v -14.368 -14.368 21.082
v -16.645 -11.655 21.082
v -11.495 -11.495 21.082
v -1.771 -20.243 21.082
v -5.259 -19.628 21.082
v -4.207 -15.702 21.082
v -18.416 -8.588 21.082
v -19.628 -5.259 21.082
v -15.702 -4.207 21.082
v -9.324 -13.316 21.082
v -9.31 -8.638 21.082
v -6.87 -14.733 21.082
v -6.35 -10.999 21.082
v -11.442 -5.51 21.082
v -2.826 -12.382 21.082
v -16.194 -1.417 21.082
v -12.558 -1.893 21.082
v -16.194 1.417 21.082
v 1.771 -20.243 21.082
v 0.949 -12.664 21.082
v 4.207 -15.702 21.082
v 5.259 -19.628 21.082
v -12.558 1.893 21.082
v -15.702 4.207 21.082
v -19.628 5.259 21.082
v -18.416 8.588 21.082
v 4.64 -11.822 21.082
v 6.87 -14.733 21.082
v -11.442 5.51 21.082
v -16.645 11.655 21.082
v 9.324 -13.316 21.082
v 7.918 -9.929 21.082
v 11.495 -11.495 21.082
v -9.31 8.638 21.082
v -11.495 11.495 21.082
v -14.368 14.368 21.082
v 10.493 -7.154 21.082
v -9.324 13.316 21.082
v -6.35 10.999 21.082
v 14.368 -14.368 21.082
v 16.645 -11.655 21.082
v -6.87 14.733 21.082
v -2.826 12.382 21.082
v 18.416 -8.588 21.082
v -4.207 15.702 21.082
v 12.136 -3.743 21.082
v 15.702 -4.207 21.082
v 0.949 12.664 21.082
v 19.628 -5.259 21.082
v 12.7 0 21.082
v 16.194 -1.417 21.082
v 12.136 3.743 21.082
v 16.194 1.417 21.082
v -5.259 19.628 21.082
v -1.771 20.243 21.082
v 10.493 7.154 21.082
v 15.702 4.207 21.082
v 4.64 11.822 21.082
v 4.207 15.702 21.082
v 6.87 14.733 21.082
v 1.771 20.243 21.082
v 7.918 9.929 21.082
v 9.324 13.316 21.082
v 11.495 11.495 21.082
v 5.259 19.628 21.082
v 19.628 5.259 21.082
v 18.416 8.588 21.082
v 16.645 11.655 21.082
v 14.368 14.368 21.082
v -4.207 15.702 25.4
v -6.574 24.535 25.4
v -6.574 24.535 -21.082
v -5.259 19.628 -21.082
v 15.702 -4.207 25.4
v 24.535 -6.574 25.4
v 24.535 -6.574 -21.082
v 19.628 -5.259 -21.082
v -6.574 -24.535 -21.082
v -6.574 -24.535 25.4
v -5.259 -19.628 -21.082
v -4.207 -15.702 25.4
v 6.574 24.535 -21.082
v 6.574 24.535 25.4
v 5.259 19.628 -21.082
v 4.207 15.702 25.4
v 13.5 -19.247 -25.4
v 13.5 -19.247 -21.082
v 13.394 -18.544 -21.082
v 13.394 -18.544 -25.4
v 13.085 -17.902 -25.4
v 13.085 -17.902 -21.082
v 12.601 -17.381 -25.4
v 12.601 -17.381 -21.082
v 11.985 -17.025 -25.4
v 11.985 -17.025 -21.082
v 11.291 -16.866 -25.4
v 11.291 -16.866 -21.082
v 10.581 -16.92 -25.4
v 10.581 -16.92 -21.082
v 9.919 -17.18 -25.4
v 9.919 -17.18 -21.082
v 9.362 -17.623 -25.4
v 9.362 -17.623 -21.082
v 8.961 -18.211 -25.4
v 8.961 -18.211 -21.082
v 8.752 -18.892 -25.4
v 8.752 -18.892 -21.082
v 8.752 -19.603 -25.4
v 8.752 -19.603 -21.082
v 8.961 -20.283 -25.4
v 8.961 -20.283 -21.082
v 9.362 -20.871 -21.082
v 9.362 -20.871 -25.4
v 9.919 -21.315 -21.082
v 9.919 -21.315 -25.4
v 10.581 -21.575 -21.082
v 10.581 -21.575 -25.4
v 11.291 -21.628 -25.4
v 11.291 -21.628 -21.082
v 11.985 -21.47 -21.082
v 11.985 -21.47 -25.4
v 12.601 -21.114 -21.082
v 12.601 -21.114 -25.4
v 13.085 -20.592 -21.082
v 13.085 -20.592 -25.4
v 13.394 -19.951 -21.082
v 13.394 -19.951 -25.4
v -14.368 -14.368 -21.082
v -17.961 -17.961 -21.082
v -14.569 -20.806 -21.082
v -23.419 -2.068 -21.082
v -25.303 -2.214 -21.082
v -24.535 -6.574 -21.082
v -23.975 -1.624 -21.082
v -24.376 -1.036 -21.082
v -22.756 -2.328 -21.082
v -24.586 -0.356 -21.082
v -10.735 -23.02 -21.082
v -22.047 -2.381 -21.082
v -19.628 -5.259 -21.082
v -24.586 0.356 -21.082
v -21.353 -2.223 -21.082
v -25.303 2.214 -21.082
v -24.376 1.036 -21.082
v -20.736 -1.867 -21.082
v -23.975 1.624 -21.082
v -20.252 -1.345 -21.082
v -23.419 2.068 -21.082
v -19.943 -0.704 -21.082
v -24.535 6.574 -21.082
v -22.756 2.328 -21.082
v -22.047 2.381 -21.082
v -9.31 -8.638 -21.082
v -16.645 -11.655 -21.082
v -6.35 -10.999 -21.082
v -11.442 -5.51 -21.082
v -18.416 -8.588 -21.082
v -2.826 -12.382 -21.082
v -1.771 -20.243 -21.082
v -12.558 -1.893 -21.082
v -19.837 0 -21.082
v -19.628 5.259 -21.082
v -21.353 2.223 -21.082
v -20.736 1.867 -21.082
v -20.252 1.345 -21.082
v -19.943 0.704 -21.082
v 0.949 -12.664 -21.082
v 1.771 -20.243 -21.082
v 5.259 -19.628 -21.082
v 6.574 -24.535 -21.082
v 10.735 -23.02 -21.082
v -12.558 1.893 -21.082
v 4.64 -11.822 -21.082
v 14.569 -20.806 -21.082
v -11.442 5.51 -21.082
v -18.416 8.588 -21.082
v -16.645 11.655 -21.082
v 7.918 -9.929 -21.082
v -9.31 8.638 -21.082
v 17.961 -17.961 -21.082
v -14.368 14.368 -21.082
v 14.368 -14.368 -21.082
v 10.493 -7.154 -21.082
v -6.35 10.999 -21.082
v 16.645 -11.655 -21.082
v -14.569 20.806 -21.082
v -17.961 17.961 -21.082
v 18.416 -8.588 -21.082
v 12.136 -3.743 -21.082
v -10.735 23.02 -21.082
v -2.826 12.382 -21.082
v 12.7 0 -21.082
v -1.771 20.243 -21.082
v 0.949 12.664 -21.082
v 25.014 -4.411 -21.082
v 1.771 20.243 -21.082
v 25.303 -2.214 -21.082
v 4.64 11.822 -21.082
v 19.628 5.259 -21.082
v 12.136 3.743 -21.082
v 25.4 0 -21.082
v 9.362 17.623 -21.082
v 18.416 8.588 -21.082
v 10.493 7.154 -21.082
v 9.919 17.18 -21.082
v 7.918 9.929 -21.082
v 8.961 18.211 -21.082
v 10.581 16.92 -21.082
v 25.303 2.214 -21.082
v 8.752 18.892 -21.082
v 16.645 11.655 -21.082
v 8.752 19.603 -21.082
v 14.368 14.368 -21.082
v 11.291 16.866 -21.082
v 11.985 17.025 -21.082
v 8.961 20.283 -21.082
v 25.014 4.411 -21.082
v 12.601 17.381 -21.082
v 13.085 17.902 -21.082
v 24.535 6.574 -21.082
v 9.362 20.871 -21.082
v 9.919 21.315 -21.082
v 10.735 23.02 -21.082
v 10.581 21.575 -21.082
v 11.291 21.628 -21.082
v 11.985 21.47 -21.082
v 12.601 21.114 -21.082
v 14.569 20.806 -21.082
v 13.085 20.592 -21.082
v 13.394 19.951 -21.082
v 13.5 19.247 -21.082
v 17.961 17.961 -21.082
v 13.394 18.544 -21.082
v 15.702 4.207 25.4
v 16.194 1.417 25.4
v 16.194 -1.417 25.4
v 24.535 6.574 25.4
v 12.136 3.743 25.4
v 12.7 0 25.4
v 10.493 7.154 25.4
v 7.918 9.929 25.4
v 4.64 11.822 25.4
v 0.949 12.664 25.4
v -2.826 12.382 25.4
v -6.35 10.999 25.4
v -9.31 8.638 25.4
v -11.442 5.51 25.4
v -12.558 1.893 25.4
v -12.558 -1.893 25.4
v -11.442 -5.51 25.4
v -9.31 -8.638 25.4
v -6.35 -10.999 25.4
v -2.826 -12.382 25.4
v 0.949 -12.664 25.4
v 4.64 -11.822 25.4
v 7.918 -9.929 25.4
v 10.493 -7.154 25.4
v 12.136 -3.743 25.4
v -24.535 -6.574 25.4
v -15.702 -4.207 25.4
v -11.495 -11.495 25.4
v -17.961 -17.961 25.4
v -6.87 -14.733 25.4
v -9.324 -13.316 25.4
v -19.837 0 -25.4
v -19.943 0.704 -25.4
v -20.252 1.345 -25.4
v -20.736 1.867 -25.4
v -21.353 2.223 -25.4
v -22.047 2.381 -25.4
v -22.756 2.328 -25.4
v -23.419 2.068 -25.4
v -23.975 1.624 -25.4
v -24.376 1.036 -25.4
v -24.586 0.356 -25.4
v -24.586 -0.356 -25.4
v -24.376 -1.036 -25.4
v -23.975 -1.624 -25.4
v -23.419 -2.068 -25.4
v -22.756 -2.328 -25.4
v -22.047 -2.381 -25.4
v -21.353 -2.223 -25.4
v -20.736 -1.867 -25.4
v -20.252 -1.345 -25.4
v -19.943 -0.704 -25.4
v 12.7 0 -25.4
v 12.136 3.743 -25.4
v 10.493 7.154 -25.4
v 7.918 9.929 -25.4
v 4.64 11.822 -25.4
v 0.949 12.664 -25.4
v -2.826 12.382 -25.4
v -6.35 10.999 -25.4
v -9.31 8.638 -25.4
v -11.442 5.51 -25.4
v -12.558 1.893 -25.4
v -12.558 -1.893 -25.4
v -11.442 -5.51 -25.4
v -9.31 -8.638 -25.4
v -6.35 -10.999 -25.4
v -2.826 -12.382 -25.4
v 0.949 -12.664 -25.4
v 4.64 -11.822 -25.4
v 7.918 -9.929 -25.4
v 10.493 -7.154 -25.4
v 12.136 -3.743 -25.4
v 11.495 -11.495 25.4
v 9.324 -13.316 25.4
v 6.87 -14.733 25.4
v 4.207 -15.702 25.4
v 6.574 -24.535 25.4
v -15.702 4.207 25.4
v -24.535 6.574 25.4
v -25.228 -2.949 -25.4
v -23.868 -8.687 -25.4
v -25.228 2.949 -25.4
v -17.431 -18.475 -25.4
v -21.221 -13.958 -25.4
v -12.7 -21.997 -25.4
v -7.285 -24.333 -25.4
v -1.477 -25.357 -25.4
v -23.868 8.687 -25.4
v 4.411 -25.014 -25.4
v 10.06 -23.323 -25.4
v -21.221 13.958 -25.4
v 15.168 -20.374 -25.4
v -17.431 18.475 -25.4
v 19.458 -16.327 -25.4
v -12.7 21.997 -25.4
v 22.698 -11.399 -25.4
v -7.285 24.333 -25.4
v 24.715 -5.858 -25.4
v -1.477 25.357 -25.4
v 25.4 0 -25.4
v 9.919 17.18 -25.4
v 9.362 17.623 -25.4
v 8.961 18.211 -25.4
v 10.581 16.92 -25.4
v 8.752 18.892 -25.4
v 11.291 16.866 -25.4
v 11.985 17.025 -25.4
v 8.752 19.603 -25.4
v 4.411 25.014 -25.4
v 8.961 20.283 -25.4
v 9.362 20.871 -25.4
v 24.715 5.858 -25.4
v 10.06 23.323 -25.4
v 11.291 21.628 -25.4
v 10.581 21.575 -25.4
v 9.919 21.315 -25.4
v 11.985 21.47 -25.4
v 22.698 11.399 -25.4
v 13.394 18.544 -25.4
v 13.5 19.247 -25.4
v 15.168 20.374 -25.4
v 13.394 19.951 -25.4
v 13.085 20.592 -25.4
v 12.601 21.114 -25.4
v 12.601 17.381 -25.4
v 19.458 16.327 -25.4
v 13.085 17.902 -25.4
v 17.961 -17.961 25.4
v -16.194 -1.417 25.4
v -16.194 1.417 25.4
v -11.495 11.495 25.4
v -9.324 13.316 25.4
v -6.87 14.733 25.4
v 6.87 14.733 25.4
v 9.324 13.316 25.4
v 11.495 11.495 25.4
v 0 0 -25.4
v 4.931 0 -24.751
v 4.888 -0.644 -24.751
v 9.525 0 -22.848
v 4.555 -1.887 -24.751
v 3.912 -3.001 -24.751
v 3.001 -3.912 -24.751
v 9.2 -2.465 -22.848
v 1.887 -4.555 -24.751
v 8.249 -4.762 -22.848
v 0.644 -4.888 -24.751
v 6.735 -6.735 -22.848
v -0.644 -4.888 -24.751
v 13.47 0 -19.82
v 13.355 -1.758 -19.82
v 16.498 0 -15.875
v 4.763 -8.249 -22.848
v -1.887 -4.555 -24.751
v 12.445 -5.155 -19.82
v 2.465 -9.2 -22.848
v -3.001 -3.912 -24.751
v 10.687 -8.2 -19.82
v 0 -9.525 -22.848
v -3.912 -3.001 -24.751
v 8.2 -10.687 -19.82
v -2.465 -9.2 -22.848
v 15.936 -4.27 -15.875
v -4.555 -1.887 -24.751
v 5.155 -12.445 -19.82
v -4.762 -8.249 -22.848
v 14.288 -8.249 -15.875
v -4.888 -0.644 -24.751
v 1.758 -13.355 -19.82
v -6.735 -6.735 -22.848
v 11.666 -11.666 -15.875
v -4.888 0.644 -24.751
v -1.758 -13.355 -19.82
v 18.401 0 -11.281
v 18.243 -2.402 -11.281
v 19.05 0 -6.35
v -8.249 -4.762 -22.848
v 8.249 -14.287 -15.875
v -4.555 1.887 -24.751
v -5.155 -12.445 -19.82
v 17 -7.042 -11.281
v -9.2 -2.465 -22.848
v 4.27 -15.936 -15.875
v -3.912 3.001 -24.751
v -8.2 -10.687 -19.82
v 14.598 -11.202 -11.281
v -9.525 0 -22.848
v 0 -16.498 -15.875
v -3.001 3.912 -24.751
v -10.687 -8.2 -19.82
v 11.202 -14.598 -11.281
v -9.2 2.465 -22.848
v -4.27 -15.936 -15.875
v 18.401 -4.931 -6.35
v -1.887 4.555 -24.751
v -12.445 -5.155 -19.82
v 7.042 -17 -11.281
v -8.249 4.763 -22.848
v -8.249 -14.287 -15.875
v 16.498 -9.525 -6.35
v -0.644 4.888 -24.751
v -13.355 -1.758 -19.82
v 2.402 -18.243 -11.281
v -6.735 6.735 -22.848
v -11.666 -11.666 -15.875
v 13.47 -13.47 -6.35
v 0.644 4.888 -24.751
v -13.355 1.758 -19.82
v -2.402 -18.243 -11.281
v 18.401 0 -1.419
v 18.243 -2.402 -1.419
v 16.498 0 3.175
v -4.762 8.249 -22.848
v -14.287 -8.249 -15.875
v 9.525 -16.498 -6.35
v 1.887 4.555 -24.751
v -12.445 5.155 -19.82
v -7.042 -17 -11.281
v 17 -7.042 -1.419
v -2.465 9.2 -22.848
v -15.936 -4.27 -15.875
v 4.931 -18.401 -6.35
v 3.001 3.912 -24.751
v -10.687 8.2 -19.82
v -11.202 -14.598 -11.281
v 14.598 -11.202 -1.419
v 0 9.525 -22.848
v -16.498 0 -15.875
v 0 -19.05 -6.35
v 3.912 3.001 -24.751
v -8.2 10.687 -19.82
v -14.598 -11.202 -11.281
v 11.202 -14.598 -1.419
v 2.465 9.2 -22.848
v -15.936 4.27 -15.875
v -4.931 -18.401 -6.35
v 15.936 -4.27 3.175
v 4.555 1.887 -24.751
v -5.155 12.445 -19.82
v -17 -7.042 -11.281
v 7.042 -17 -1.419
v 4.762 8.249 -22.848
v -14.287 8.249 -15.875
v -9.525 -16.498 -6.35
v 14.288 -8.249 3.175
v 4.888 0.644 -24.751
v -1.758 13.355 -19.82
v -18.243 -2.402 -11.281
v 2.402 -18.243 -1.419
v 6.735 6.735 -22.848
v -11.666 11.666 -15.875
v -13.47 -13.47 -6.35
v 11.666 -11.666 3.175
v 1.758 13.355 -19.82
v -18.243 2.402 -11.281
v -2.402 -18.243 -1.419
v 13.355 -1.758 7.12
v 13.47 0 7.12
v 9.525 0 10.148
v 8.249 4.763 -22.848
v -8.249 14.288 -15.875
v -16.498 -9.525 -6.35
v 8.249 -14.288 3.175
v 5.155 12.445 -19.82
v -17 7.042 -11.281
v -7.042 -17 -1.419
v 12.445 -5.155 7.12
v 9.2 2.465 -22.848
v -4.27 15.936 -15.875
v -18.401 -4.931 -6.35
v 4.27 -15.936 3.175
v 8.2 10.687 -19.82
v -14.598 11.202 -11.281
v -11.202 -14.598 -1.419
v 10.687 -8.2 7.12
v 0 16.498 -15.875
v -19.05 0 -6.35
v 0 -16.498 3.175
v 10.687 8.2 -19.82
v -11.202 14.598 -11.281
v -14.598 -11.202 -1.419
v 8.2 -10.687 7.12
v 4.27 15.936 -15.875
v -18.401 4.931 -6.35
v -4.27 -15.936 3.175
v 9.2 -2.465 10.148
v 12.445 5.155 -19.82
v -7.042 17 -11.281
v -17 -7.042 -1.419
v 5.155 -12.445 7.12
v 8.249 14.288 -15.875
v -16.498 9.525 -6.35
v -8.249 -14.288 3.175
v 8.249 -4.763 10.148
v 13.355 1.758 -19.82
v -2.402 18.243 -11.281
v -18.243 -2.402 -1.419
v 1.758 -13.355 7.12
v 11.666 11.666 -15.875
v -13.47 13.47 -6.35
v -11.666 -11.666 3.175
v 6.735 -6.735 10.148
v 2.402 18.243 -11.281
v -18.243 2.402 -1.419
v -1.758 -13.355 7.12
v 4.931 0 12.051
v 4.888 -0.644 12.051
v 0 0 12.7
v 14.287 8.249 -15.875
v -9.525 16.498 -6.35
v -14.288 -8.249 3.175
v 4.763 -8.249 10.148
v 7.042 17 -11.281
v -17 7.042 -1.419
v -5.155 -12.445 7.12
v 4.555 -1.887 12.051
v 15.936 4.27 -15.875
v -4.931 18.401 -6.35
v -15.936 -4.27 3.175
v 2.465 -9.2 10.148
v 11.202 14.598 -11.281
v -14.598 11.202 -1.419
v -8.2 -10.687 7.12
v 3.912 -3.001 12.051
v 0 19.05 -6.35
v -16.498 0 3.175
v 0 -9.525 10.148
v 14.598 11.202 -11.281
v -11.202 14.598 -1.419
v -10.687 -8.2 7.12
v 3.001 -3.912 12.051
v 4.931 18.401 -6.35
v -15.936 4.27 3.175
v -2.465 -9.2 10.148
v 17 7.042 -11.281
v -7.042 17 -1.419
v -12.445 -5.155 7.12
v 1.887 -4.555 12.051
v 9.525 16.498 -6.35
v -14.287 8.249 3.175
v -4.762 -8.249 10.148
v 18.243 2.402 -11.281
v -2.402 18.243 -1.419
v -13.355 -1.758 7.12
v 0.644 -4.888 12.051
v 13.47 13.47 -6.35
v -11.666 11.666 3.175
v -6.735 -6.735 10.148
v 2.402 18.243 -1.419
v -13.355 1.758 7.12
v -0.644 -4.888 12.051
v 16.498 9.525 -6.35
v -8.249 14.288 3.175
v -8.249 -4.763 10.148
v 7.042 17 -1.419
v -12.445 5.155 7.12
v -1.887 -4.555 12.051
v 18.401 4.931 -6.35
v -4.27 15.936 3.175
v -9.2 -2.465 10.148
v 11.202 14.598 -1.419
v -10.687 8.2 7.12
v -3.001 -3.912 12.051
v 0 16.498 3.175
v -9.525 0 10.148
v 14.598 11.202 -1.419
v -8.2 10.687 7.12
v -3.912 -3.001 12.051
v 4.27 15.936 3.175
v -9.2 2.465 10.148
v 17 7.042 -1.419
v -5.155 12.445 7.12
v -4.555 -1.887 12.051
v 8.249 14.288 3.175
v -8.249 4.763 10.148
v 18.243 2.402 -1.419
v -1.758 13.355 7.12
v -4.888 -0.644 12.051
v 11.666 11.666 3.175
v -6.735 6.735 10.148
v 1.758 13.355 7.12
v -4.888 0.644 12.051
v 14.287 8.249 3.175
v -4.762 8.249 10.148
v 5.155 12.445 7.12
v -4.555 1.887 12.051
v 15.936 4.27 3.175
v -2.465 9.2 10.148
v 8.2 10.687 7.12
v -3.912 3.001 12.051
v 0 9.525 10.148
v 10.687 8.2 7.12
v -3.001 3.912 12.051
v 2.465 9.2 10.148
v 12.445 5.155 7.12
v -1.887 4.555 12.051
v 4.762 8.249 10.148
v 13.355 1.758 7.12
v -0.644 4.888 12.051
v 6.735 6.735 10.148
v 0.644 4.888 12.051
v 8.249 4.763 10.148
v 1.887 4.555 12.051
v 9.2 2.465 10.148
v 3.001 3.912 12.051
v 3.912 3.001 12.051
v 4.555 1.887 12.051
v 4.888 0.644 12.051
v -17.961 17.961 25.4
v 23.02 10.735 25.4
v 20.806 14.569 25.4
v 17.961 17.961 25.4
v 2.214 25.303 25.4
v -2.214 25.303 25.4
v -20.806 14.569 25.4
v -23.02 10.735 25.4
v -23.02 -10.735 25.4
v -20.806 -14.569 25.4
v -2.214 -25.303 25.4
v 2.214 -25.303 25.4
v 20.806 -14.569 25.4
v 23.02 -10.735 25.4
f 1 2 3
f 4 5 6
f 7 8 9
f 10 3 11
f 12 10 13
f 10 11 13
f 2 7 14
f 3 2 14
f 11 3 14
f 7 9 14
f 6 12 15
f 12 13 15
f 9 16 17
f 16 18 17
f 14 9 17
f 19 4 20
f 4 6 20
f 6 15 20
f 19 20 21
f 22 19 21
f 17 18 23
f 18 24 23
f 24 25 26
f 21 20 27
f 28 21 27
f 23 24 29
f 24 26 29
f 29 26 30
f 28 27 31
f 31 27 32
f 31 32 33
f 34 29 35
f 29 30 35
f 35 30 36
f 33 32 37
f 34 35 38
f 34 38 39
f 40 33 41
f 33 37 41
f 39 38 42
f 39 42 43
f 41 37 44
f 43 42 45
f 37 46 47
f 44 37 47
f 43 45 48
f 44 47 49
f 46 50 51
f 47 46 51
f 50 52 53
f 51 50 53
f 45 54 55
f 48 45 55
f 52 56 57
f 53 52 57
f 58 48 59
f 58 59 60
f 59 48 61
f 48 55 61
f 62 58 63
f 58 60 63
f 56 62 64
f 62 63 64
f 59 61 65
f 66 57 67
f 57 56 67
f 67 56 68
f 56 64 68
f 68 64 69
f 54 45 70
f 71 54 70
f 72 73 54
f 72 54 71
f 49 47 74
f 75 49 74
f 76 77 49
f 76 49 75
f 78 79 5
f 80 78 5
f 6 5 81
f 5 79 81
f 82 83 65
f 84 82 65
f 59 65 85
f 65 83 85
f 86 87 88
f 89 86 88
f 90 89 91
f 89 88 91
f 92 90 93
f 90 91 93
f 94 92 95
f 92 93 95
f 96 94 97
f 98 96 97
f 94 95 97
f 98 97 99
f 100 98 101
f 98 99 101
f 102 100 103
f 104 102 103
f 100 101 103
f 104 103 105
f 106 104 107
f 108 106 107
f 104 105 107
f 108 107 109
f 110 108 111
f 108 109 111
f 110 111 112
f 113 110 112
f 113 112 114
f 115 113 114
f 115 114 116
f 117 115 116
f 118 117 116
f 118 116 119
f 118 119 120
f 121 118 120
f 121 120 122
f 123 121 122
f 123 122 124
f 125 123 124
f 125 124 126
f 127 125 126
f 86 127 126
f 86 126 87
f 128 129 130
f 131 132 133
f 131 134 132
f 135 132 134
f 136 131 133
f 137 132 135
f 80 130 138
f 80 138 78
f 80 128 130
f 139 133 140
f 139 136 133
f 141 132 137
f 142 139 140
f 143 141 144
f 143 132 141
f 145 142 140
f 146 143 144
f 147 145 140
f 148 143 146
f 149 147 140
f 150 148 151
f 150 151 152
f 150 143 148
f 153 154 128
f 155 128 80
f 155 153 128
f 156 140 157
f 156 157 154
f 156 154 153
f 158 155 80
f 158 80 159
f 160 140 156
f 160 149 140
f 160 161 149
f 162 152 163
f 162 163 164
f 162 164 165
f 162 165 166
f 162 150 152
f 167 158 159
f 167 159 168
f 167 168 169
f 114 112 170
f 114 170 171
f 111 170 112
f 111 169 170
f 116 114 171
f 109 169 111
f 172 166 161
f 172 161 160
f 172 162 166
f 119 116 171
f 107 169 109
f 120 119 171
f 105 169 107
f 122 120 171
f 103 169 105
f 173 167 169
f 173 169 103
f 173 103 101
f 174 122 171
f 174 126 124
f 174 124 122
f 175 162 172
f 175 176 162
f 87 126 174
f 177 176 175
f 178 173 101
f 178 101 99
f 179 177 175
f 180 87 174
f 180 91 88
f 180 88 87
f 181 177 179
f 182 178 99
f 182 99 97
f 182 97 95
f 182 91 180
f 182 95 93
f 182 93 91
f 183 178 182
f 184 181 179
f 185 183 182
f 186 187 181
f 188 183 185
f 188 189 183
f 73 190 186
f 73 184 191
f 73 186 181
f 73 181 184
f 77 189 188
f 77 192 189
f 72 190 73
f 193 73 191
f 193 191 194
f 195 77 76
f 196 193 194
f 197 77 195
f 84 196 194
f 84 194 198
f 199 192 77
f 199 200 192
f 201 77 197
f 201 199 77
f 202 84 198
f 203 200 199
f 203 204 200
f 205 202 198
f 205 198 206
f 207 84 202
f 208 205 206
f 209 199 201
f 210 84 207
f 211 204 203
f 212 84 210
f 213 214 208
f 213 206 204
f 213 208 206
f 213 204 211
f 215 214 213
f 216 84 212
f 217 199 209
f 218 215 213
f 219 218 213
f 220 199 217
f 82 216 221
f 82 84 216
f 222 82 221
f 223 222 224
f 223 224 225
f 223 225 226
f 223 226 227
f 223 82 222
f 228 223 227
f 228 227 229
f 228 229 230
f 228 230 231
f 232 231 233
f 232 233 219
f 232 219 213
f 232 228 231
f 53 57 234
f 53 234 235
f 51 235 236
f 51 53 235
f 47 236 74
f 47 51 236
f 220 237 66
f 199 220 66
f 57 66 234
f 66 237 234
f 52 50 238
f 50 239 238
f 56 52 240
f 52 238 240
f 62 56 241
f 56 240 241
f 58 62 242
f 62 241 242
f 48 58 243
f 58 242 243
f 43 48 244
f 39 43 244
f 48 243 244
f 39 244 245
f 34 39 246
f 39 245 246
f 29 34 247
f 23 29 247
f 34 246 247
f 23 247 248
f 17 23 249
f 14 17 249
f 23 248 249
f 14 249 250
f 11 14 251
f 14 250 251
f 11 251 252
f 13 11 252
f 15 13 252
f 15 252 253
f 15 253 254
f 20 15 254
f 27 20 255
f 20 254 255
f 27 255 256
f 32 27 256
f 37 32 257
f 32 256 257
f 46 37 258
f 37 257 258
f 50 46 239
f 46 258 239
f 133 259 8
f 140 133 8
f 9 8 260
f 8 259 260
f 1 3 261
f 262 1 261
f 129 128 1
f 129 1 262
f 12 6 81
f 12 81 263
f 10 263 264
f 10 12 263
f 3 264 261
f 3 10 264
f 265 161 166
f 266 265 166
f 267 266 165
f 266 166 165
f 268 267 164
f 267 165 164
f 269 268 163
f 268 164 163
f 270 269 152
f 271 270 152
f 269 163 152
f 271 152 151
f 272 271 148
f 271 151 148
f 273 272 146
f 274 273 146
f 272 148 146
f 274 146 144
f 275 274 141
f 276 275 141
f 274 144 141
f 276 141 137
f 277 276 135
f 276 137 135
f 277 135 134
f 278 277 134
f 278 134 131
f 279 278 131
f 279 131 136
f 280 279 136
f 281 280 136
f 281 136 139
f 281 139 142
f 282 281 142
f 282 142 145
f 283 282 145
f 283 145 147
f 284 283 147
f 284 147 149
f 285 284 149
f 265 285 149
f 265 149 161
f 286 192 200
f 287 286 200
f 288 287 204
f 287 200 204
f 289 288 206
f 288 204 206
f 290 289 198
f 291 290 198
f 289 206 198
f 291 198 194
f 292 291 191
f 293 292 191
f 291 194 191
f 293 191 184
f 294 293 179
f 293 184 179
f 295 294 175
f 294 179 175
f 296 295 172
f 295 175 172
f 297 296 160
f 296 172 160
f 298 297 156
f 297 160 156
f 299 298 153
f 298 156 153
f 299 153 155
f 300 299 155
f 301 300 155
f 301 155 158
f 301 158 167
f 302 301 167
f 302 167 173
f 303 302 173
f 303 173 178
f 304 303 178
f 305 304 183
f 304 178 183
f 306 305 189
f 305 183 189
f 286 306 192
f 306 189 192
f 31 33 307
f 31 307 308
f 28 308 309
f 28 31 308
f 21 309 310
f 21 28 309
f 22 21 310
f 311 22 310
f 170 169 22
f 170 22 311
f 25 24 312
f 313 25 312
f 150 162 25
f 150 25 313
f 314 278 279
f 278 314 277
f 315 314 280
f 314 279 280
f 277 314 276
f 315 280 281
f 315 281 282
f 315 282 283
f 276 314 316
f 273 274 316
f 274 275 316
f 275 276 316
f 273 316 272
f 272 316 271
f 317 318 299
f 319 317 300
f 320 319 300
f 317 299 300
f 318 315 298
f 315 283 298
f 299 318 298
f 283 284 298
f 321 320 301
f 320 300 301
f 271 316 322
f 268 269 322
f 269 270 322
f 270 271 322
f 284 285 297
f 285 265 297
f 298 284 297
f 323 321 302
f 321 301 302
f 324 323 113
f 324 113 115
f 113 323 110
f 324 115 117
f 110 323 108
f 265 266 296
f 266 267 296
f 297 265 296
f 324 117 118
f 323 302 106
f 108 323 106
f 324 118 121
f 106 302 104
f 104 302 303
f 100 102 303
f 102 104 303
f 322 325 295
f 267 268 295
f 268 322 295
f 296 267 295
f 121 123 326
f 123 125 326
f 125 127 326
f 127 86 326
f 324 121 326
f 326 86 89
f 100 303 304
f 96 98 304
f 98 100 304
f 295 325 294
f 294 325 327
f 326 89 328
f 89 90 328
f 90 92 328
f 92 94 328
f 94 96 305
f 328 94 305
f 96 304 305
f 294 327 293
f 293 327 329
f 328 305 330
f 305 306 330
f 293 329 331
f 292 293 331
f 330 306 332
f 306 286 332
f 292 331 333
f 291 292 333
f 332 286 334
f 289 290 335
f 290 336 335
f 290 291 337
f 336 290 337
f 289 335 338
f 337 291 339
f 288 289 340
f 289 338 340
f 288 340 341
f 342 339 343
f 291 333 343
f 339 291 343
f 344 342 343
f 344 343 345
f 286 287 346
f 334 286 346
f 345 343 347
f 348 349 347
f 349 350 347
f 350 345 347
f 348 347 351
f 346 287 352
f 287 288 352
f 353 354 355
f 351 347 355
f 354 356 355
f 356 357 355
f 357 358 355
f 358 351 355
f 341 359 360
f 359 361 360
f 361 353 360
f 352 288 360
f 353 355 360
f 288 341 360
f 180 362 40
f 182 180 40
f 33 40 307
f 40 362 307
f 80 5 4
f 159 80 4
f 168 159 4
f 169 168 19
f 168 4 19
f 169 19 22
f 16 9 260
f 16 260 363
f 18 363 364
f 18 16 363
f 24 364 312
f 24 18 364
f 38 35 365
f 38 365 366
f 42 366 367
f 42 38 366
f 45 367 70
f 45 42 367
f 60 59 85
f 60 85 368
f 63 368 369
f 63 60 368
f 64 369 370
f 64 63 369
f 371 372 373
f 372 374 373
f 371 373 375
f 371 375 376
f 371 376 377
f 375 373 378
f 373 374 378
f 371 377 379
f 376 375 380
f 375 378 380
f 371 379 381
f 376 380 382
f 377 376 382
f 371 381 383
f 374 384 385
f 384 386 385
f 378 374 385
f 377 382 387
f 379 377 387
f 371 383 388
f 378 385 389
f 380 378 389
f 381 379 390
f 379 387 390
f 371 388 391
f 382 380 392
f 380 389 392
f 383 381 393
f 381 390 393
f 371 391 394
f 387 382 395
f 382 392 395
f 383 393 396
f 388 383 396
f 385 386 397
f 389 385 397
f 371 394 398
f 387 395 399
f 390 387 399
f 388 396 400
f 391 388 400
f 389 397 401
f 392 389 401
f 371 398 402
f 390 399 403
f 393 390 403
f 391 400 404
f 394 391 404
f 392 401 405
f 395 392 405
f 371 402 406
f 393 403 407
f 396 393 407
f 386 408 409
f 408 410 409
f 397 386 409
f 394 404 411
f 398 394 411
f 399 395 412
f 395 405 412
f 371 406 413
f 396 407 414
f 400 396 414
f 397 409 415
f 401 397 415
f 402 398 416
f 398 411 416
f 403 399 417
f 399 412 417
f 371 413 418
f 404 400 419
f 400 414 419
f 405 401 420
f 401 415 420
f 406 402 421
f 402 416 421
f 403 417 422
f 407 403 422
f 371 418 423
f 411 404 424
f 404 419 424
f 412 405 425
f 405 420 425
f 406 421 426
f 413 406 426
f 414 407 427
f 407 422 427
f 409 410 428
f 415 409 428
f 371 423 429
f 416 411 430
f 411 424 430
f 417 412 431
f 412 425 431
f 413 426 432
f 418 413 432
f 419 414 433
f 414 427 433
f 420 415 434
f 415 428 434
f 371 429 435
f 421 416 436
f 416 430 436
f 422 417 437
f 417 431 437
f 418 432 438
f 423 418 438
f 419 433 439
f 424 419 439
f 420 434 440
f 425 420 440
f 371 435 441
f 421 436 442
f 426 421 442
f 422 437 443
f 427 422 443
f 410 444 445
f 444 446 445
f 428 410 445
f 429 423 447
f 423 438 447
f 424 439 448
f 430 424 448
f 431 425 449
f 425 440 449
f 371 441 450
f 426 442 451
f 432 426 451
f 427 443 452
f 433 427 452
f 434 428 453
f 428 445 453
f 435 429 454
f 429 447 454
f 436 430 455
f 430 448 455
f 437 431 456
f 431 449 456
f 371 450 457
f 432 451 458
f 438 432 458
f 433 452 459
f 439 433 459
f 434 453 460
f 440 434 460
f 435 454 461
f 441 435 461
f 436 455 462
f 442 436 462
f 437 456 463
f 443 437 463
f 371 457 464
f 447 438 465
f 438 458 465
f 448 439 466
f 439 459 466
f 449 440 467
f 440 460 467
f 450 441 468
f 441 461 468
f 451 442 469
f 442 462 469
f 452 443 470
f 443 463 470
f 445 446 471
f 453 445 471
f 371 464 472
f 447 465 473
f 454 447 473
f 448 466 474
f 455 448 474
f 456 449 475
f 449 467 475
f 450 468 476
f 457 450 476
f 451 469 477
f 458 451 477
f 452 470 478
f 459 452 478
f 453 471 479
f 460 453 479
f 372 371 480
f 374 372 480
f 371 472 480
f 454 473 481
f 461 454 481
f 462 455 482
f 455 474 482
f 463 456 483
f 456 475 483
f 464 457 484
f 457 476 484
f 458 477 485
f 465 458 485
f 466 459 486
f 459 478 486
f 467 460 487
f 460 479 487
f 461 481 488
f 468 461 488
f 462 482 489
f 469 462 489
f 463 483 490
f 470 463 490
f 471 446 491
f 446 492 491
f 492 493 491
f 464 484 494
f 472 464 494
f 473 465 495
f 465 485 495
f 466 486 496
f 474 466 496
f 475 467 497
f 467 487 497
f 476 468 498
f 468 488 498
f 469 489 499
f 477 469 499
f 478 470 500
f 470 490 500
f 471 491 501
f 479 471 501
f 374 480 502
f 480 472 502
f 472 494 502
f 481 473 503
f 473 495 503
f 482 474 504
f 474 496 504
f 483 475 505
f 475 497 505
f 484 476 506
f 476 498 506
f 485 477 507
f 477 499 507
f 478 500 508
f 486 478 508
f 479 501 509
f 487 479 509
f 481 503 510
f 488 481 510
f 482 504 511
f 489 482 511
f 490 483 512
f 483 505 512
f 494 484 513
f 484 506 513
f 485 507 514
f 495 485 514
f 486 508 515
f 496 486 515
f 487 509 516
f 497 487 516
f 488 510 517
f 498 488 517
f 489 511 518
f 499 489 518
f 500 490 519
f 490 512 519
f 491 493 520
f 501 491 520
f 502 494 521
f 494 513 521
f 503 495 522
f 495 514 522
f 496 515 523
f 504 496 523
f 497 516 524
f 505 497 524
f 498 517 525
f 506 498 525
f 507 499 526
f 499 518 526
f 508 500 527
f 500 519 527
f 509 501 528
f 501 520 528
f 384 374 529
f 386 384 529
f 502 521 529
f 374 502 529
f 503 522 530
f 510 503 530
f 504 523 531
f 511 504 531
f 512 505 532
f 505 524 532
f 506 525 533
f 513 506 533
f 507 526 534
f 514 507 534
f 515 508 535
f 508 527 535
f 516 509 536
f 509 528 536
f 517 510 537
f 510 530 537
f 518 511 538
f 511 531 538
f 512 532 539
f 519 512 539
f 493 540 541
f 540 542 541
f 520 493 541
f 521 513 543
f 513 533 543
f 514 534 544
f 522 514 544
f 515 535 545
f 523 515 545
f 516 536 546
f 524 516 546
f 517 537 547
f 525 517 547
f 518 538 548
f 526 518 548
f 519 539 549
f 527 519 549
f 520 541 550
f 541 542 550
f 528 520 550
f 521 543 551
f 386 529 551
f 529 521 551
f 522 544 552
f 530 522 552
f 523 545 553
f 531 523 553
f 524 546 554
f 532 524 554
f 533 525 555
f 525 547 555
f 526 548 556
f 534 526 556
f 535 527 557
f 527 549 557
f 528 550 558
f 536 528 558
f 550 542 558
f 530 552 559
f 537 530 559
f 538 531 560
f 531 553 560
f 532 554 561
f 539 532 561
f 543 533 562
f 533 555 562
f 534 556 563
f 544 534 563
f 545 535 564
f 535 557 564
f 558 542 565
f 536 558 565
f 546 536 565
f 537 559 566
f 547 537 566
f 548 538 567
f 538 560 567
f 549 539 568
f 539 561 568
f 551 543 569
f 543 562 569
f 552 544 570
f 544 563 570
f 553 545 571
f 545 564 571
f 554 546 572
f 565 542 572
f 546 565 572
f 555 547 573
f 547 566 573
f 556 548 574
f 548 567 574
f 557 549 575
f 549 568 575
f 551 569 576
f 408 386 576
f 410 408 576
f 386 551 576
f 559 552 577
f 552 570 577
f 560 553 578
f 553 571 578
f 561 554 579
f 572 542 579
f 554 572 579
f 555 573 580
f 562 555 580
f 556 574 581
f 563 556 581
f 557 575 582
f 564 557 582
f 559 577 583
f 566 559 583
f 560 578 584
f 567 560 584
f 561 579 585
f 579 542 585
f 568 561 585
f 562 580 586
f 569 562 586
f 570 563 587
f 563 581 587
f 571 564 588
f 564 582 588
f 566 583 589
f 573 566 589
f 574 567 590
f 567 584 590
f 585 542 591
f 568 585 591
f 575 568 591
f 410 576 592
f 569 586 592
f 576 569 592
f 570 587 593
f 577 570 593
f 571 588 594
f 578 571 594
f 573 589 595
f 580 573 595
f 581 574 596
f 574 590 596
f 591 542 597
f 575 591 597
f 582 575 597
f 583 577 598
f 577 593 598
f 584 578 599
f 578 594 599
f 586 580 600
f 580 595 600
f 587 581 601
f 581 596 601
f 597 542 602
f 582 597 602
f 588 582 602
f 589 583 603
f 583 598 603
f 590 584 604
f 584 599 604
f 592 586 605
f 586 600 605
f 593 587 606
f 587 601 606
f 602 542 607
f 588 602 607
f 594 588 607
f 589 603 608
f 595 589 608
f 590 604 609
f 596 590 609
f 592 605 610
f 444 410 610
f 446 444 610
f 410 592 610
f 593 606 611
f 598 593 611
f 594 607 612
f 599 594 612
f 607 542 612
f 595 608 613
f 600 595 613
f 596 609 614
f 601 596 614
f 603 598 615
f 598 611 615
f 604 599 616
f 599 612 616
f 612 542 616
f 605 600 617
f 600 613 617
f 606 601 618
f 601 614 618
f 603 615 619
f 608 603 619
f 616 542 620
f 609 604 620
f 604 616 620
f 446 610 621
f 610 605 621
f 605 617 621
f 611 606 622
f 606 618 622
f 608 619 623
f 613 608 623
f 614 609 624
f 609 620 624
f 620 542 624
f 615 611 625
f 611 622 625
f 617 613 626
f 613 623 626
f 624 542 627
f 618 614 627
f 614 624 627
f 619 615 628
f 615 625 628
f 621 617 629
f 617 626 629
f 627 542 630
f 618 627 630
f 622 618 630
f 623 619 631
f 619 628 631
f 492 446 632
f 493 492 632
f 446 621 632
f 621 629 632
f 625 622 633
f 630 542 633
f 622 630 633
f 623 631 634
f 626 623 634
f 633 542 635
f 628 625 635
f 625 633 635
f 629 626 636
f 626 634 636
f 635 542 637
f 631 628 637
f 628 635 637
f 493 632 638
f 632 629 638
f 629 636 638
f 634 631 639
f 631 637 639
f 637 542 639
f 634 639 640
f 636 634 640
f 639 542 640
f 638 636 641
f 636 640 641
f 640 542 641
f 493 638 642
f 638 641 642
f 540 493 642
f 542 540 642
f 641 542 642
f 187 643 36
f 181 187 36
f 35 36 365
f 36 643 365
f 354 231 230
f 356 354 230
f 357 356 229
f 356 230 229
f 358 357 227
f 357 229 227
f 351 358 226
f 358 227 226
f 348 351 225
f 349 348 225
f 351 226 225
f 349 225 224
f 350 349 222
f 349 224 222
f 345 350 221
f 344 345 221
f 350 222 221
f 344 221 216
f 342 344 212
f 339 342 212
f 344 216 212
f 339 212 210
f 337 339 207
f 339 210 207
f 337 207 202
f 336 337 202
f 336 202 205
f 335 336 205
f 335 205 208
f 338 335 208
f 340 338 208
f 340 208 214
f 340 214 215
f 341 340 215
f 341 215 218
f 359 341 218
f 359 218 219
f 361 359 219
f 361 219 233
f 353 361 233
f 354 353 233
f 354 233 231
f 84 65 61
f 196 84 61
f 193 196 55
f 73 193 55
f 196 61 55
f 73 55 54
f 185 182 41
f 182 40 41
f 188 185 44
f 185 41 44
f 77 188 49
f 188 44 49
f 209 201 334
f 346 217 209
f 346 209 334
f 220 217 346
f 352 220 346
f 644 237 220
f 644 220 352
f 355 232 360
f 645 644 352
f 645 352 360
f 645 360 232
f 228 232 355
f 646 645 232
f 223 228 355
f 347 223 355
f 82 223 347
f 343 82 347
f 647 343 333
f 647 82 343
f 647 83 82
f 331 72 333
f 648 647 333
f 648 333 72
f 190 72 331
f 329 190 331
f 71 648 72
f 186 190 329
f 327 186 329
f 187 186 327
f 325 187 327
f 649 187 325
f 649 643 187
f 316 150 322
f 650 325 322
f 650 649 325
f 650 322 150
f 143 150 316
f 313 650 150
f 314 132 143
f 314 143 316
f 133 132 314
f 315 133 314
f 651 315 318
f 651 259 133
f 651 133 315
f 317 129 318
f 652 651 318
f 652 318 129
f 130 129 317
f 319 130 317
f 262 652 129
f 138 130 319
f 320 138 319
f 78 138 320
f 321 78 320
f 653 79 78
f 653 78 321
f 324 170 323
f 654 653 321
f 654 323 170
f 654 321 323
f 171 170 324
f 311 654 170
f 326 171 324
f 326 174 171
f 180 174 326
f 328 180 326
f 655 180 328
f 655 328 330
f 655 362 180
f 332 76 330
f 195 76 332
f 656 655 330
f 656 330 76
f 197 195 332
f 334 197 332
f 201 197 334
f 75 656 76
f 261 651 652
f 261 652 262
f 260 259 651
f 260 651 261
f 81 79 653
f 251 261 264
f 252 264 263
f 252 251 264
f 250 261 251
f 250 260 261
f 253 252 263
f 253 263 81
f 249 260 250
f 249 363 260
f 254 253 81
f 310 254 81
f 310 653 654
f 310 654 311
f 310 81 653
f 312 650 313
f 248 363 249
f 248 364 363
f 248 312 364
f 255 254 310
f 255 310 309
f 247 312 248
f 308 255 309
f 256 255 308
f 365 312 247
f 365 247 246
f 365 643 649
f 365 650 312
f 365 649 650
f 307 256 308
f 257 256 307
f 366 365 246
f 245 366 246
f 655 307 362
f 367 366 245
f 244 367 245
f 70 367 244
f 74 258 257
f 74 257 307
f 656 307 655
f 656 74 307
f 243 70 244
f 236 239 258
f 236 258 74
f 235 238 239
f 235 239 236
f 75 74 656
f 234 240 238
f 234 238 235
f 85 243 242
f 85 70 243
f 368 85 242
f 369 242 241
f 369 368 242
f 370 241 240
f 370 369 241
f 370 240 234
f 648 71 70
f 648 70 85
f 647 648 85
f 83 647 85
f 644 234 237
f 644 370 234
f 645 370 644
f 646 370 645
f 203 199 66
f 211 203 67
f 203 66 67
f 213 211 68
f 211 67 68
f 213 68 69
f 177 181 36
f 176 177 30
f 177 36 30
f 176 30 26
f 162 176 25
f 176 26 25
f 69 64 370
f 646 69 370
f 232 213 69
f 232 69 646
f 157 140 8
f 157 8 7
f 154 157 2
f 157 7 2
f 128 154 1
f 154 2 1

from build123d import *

# Parameters (mm, degrees)
F0_R          = 25.4
F1_DEPTH      = 25.4
F2_R          = 12.7
F3_DEPTH      = 25.401
F3_DEPTH_BACK = 25.401
F4_R          = 20.32
F5_DEPTH      = 21.082
F6_R          = 2.3876
F7_DEPTH      = 25.401
F7_DEPTH_BACK = 25.401
F9_DEPTH      = 25.401
F9_DEPTH_BACK = 21.082


with BuildPart() as f1:
    # F0 (on Top) → F1 (new body, symmetric)
    with BuildSketch(Plane.XY):
        Circle(F0_R)
    extrude(amount=F1_DEPTH, both=True)

    # F2 (on Top) → F3 (cut, two sides)
    with BuildSketch(Plane.XY) as f3_sk:
        Circle(F2_R)
    extrude(amount=-F3_DEPTH, mode=Mode.SUBTRACT)
    extrude(f3_sk.sketch, amount=F3_DEPTH_BACK, mode=Mode.SUBTRACT)

    # F4 (on Top) → F5 (cut, symmetric)
    with BuildSketch(Plane.XY):
        Circle(F4_R)
    extrude(amount=F5_DEPTH, both=True, mode=Mode.SUBTRACT)

    # F6 (on Top) → F7 (cut, two sides)
    with BuildSketch(Plane.XY) as f7_sk:
        with Locations((-22.225, 0)):
            Circle(F6_R)
        with Locations((11.1125, 19.2474145991)):
            Circle(F6_R)
        with Locations((11.1125, -19.2474145991)):
            Circle(F6_R)
    extrude(amount=-F7_DEPTH, mode=Mode.SUBTRACT)
    extrude(f7_sk.sketch, amount=F7_DEPTH_BACK, mode=Mode.SUBTRACT)

    # F8 (on Top) → F9 (cut, two sides)
    with BuildSketch(Plane.XY) as f9_sk:
        with BuildLine():
            Line((-15.7020902322, 4.2073623972), (-24.5345159877, 6.5740037456))
            ThreePointArc((-24.5345159877, 6.5740037456), (-25.4, 0), (-24.5345159877, -6.5740037456))
            Line((-24.5345159877, -6.5740037456), (-15.7020902322, -4.2073623972))
            ThreePointArc((-15.7020902322, -4.2073623972), (-16.256, 0), (-15.7020902322, 4.2073623972))
        make_face()
        with BuildLine():
            ThreePointArc((-6.5740037456, 24.5345159877), (-12.7, 21.9970452561), (-17.9605122421, 17.9605122421))
            Line((-17.9605122421, 17.9605122421), (-11.494727835, 11.494727835))
            ThreePointArc((-11.494727835, 11.494727835), (-8.128, 14.0781089639), (-4.2073623972, 15.7020902322))
            Line((-4.2073623972, 15.7020902322), (-6.5740037456, 24.5345159877))
        make_face()
        with BuildLine():
            Line((-11.494727835, -11.494727835), (-17.9605122421, -17.9605122421))
            ThreePointArc((-17.9605122421, -17.9605122421), (-12.7, -21.9970452561), (-6.5740037456, -24.5345159877))
            Line((-6.5740037456, -24.5345159877), (-4.2073623972, -15.7020902322))
            ThreePointArc((-4.2073623972, -15.7020902322), (-8.128, -14.0781089639), (-11.494727835, -11.494727835))
        make_face()
        with BuildLine():
            Line((11.494727835, 11.494727835), (17.9605122421, 17.9605122421))
            ThreePointArc((17.9605122421, 17.9605122421), (12.7, 21.9970452561), (6.5740037456, 24.5345159877))
            Line((6.5740037456, 24.5345159877), (4.2073623972, 15.7020902322))
            ThreePointArc((4.2073623972, 15.7020902322), (8.128, 14.0781089639), (11.494727835, 11.494727835))
        make_face()
        with BuildLine():
            ThreePointArc((24.5345159877, -6.5740037456), (25.4, 0), (24.5345159877, 6.5740037456))
            Line((24.5345159877, 6.5740037456), (15.7020902322, 4.2073623972))
            ThreePointArc((15.7020902322, 4.2073623972), (16.256, 0), (15.7020902322, -4.2073623972))
            Line((15.7020902322, -4.2073623972), (24.5345159877, -6.5740037456))
        make_face()
        with BuildLine():
            Line((17.9605122421, -17.9605122421), (11.494727835, -11.494727835))
            ThreePointArc((11.494727835, -11.494727835), (8.128, -14.0781089639), (4.2073623972, -15.7020902322))
            Line((4.2073623972, -15.7020902322), (6.5740037456, -24.5345159877))
            ThreePointArc((6.5740037456, -24.5345159877), (12.7, -21.9970452561), (17.9605122421, -17.9605122421))
        make_face()
    extrude(amount=F9_DEPTH, mode=Mode.SUBTRACT)
    extrude(f9_sk.sketch, amount=-F9_DEPTH_BACK, mode=Mode.SUBTRACT)


with BuildPart() as f11:
    # F10 (on Front) → F11 (revolve)
    with BuildSketch(Plane.XZ):
        with BuildLine():
            ThreePointArc((0, -25.4), (19.05, -6.35), (0, 12.7))
            Line((0, 12.7), (0, -25.4))
        make_face()
    revolve(axis=Axis((0, 0, -0.1289846554), (0, 0, -1)))


solid = Compound([f1.part, f11.part])
